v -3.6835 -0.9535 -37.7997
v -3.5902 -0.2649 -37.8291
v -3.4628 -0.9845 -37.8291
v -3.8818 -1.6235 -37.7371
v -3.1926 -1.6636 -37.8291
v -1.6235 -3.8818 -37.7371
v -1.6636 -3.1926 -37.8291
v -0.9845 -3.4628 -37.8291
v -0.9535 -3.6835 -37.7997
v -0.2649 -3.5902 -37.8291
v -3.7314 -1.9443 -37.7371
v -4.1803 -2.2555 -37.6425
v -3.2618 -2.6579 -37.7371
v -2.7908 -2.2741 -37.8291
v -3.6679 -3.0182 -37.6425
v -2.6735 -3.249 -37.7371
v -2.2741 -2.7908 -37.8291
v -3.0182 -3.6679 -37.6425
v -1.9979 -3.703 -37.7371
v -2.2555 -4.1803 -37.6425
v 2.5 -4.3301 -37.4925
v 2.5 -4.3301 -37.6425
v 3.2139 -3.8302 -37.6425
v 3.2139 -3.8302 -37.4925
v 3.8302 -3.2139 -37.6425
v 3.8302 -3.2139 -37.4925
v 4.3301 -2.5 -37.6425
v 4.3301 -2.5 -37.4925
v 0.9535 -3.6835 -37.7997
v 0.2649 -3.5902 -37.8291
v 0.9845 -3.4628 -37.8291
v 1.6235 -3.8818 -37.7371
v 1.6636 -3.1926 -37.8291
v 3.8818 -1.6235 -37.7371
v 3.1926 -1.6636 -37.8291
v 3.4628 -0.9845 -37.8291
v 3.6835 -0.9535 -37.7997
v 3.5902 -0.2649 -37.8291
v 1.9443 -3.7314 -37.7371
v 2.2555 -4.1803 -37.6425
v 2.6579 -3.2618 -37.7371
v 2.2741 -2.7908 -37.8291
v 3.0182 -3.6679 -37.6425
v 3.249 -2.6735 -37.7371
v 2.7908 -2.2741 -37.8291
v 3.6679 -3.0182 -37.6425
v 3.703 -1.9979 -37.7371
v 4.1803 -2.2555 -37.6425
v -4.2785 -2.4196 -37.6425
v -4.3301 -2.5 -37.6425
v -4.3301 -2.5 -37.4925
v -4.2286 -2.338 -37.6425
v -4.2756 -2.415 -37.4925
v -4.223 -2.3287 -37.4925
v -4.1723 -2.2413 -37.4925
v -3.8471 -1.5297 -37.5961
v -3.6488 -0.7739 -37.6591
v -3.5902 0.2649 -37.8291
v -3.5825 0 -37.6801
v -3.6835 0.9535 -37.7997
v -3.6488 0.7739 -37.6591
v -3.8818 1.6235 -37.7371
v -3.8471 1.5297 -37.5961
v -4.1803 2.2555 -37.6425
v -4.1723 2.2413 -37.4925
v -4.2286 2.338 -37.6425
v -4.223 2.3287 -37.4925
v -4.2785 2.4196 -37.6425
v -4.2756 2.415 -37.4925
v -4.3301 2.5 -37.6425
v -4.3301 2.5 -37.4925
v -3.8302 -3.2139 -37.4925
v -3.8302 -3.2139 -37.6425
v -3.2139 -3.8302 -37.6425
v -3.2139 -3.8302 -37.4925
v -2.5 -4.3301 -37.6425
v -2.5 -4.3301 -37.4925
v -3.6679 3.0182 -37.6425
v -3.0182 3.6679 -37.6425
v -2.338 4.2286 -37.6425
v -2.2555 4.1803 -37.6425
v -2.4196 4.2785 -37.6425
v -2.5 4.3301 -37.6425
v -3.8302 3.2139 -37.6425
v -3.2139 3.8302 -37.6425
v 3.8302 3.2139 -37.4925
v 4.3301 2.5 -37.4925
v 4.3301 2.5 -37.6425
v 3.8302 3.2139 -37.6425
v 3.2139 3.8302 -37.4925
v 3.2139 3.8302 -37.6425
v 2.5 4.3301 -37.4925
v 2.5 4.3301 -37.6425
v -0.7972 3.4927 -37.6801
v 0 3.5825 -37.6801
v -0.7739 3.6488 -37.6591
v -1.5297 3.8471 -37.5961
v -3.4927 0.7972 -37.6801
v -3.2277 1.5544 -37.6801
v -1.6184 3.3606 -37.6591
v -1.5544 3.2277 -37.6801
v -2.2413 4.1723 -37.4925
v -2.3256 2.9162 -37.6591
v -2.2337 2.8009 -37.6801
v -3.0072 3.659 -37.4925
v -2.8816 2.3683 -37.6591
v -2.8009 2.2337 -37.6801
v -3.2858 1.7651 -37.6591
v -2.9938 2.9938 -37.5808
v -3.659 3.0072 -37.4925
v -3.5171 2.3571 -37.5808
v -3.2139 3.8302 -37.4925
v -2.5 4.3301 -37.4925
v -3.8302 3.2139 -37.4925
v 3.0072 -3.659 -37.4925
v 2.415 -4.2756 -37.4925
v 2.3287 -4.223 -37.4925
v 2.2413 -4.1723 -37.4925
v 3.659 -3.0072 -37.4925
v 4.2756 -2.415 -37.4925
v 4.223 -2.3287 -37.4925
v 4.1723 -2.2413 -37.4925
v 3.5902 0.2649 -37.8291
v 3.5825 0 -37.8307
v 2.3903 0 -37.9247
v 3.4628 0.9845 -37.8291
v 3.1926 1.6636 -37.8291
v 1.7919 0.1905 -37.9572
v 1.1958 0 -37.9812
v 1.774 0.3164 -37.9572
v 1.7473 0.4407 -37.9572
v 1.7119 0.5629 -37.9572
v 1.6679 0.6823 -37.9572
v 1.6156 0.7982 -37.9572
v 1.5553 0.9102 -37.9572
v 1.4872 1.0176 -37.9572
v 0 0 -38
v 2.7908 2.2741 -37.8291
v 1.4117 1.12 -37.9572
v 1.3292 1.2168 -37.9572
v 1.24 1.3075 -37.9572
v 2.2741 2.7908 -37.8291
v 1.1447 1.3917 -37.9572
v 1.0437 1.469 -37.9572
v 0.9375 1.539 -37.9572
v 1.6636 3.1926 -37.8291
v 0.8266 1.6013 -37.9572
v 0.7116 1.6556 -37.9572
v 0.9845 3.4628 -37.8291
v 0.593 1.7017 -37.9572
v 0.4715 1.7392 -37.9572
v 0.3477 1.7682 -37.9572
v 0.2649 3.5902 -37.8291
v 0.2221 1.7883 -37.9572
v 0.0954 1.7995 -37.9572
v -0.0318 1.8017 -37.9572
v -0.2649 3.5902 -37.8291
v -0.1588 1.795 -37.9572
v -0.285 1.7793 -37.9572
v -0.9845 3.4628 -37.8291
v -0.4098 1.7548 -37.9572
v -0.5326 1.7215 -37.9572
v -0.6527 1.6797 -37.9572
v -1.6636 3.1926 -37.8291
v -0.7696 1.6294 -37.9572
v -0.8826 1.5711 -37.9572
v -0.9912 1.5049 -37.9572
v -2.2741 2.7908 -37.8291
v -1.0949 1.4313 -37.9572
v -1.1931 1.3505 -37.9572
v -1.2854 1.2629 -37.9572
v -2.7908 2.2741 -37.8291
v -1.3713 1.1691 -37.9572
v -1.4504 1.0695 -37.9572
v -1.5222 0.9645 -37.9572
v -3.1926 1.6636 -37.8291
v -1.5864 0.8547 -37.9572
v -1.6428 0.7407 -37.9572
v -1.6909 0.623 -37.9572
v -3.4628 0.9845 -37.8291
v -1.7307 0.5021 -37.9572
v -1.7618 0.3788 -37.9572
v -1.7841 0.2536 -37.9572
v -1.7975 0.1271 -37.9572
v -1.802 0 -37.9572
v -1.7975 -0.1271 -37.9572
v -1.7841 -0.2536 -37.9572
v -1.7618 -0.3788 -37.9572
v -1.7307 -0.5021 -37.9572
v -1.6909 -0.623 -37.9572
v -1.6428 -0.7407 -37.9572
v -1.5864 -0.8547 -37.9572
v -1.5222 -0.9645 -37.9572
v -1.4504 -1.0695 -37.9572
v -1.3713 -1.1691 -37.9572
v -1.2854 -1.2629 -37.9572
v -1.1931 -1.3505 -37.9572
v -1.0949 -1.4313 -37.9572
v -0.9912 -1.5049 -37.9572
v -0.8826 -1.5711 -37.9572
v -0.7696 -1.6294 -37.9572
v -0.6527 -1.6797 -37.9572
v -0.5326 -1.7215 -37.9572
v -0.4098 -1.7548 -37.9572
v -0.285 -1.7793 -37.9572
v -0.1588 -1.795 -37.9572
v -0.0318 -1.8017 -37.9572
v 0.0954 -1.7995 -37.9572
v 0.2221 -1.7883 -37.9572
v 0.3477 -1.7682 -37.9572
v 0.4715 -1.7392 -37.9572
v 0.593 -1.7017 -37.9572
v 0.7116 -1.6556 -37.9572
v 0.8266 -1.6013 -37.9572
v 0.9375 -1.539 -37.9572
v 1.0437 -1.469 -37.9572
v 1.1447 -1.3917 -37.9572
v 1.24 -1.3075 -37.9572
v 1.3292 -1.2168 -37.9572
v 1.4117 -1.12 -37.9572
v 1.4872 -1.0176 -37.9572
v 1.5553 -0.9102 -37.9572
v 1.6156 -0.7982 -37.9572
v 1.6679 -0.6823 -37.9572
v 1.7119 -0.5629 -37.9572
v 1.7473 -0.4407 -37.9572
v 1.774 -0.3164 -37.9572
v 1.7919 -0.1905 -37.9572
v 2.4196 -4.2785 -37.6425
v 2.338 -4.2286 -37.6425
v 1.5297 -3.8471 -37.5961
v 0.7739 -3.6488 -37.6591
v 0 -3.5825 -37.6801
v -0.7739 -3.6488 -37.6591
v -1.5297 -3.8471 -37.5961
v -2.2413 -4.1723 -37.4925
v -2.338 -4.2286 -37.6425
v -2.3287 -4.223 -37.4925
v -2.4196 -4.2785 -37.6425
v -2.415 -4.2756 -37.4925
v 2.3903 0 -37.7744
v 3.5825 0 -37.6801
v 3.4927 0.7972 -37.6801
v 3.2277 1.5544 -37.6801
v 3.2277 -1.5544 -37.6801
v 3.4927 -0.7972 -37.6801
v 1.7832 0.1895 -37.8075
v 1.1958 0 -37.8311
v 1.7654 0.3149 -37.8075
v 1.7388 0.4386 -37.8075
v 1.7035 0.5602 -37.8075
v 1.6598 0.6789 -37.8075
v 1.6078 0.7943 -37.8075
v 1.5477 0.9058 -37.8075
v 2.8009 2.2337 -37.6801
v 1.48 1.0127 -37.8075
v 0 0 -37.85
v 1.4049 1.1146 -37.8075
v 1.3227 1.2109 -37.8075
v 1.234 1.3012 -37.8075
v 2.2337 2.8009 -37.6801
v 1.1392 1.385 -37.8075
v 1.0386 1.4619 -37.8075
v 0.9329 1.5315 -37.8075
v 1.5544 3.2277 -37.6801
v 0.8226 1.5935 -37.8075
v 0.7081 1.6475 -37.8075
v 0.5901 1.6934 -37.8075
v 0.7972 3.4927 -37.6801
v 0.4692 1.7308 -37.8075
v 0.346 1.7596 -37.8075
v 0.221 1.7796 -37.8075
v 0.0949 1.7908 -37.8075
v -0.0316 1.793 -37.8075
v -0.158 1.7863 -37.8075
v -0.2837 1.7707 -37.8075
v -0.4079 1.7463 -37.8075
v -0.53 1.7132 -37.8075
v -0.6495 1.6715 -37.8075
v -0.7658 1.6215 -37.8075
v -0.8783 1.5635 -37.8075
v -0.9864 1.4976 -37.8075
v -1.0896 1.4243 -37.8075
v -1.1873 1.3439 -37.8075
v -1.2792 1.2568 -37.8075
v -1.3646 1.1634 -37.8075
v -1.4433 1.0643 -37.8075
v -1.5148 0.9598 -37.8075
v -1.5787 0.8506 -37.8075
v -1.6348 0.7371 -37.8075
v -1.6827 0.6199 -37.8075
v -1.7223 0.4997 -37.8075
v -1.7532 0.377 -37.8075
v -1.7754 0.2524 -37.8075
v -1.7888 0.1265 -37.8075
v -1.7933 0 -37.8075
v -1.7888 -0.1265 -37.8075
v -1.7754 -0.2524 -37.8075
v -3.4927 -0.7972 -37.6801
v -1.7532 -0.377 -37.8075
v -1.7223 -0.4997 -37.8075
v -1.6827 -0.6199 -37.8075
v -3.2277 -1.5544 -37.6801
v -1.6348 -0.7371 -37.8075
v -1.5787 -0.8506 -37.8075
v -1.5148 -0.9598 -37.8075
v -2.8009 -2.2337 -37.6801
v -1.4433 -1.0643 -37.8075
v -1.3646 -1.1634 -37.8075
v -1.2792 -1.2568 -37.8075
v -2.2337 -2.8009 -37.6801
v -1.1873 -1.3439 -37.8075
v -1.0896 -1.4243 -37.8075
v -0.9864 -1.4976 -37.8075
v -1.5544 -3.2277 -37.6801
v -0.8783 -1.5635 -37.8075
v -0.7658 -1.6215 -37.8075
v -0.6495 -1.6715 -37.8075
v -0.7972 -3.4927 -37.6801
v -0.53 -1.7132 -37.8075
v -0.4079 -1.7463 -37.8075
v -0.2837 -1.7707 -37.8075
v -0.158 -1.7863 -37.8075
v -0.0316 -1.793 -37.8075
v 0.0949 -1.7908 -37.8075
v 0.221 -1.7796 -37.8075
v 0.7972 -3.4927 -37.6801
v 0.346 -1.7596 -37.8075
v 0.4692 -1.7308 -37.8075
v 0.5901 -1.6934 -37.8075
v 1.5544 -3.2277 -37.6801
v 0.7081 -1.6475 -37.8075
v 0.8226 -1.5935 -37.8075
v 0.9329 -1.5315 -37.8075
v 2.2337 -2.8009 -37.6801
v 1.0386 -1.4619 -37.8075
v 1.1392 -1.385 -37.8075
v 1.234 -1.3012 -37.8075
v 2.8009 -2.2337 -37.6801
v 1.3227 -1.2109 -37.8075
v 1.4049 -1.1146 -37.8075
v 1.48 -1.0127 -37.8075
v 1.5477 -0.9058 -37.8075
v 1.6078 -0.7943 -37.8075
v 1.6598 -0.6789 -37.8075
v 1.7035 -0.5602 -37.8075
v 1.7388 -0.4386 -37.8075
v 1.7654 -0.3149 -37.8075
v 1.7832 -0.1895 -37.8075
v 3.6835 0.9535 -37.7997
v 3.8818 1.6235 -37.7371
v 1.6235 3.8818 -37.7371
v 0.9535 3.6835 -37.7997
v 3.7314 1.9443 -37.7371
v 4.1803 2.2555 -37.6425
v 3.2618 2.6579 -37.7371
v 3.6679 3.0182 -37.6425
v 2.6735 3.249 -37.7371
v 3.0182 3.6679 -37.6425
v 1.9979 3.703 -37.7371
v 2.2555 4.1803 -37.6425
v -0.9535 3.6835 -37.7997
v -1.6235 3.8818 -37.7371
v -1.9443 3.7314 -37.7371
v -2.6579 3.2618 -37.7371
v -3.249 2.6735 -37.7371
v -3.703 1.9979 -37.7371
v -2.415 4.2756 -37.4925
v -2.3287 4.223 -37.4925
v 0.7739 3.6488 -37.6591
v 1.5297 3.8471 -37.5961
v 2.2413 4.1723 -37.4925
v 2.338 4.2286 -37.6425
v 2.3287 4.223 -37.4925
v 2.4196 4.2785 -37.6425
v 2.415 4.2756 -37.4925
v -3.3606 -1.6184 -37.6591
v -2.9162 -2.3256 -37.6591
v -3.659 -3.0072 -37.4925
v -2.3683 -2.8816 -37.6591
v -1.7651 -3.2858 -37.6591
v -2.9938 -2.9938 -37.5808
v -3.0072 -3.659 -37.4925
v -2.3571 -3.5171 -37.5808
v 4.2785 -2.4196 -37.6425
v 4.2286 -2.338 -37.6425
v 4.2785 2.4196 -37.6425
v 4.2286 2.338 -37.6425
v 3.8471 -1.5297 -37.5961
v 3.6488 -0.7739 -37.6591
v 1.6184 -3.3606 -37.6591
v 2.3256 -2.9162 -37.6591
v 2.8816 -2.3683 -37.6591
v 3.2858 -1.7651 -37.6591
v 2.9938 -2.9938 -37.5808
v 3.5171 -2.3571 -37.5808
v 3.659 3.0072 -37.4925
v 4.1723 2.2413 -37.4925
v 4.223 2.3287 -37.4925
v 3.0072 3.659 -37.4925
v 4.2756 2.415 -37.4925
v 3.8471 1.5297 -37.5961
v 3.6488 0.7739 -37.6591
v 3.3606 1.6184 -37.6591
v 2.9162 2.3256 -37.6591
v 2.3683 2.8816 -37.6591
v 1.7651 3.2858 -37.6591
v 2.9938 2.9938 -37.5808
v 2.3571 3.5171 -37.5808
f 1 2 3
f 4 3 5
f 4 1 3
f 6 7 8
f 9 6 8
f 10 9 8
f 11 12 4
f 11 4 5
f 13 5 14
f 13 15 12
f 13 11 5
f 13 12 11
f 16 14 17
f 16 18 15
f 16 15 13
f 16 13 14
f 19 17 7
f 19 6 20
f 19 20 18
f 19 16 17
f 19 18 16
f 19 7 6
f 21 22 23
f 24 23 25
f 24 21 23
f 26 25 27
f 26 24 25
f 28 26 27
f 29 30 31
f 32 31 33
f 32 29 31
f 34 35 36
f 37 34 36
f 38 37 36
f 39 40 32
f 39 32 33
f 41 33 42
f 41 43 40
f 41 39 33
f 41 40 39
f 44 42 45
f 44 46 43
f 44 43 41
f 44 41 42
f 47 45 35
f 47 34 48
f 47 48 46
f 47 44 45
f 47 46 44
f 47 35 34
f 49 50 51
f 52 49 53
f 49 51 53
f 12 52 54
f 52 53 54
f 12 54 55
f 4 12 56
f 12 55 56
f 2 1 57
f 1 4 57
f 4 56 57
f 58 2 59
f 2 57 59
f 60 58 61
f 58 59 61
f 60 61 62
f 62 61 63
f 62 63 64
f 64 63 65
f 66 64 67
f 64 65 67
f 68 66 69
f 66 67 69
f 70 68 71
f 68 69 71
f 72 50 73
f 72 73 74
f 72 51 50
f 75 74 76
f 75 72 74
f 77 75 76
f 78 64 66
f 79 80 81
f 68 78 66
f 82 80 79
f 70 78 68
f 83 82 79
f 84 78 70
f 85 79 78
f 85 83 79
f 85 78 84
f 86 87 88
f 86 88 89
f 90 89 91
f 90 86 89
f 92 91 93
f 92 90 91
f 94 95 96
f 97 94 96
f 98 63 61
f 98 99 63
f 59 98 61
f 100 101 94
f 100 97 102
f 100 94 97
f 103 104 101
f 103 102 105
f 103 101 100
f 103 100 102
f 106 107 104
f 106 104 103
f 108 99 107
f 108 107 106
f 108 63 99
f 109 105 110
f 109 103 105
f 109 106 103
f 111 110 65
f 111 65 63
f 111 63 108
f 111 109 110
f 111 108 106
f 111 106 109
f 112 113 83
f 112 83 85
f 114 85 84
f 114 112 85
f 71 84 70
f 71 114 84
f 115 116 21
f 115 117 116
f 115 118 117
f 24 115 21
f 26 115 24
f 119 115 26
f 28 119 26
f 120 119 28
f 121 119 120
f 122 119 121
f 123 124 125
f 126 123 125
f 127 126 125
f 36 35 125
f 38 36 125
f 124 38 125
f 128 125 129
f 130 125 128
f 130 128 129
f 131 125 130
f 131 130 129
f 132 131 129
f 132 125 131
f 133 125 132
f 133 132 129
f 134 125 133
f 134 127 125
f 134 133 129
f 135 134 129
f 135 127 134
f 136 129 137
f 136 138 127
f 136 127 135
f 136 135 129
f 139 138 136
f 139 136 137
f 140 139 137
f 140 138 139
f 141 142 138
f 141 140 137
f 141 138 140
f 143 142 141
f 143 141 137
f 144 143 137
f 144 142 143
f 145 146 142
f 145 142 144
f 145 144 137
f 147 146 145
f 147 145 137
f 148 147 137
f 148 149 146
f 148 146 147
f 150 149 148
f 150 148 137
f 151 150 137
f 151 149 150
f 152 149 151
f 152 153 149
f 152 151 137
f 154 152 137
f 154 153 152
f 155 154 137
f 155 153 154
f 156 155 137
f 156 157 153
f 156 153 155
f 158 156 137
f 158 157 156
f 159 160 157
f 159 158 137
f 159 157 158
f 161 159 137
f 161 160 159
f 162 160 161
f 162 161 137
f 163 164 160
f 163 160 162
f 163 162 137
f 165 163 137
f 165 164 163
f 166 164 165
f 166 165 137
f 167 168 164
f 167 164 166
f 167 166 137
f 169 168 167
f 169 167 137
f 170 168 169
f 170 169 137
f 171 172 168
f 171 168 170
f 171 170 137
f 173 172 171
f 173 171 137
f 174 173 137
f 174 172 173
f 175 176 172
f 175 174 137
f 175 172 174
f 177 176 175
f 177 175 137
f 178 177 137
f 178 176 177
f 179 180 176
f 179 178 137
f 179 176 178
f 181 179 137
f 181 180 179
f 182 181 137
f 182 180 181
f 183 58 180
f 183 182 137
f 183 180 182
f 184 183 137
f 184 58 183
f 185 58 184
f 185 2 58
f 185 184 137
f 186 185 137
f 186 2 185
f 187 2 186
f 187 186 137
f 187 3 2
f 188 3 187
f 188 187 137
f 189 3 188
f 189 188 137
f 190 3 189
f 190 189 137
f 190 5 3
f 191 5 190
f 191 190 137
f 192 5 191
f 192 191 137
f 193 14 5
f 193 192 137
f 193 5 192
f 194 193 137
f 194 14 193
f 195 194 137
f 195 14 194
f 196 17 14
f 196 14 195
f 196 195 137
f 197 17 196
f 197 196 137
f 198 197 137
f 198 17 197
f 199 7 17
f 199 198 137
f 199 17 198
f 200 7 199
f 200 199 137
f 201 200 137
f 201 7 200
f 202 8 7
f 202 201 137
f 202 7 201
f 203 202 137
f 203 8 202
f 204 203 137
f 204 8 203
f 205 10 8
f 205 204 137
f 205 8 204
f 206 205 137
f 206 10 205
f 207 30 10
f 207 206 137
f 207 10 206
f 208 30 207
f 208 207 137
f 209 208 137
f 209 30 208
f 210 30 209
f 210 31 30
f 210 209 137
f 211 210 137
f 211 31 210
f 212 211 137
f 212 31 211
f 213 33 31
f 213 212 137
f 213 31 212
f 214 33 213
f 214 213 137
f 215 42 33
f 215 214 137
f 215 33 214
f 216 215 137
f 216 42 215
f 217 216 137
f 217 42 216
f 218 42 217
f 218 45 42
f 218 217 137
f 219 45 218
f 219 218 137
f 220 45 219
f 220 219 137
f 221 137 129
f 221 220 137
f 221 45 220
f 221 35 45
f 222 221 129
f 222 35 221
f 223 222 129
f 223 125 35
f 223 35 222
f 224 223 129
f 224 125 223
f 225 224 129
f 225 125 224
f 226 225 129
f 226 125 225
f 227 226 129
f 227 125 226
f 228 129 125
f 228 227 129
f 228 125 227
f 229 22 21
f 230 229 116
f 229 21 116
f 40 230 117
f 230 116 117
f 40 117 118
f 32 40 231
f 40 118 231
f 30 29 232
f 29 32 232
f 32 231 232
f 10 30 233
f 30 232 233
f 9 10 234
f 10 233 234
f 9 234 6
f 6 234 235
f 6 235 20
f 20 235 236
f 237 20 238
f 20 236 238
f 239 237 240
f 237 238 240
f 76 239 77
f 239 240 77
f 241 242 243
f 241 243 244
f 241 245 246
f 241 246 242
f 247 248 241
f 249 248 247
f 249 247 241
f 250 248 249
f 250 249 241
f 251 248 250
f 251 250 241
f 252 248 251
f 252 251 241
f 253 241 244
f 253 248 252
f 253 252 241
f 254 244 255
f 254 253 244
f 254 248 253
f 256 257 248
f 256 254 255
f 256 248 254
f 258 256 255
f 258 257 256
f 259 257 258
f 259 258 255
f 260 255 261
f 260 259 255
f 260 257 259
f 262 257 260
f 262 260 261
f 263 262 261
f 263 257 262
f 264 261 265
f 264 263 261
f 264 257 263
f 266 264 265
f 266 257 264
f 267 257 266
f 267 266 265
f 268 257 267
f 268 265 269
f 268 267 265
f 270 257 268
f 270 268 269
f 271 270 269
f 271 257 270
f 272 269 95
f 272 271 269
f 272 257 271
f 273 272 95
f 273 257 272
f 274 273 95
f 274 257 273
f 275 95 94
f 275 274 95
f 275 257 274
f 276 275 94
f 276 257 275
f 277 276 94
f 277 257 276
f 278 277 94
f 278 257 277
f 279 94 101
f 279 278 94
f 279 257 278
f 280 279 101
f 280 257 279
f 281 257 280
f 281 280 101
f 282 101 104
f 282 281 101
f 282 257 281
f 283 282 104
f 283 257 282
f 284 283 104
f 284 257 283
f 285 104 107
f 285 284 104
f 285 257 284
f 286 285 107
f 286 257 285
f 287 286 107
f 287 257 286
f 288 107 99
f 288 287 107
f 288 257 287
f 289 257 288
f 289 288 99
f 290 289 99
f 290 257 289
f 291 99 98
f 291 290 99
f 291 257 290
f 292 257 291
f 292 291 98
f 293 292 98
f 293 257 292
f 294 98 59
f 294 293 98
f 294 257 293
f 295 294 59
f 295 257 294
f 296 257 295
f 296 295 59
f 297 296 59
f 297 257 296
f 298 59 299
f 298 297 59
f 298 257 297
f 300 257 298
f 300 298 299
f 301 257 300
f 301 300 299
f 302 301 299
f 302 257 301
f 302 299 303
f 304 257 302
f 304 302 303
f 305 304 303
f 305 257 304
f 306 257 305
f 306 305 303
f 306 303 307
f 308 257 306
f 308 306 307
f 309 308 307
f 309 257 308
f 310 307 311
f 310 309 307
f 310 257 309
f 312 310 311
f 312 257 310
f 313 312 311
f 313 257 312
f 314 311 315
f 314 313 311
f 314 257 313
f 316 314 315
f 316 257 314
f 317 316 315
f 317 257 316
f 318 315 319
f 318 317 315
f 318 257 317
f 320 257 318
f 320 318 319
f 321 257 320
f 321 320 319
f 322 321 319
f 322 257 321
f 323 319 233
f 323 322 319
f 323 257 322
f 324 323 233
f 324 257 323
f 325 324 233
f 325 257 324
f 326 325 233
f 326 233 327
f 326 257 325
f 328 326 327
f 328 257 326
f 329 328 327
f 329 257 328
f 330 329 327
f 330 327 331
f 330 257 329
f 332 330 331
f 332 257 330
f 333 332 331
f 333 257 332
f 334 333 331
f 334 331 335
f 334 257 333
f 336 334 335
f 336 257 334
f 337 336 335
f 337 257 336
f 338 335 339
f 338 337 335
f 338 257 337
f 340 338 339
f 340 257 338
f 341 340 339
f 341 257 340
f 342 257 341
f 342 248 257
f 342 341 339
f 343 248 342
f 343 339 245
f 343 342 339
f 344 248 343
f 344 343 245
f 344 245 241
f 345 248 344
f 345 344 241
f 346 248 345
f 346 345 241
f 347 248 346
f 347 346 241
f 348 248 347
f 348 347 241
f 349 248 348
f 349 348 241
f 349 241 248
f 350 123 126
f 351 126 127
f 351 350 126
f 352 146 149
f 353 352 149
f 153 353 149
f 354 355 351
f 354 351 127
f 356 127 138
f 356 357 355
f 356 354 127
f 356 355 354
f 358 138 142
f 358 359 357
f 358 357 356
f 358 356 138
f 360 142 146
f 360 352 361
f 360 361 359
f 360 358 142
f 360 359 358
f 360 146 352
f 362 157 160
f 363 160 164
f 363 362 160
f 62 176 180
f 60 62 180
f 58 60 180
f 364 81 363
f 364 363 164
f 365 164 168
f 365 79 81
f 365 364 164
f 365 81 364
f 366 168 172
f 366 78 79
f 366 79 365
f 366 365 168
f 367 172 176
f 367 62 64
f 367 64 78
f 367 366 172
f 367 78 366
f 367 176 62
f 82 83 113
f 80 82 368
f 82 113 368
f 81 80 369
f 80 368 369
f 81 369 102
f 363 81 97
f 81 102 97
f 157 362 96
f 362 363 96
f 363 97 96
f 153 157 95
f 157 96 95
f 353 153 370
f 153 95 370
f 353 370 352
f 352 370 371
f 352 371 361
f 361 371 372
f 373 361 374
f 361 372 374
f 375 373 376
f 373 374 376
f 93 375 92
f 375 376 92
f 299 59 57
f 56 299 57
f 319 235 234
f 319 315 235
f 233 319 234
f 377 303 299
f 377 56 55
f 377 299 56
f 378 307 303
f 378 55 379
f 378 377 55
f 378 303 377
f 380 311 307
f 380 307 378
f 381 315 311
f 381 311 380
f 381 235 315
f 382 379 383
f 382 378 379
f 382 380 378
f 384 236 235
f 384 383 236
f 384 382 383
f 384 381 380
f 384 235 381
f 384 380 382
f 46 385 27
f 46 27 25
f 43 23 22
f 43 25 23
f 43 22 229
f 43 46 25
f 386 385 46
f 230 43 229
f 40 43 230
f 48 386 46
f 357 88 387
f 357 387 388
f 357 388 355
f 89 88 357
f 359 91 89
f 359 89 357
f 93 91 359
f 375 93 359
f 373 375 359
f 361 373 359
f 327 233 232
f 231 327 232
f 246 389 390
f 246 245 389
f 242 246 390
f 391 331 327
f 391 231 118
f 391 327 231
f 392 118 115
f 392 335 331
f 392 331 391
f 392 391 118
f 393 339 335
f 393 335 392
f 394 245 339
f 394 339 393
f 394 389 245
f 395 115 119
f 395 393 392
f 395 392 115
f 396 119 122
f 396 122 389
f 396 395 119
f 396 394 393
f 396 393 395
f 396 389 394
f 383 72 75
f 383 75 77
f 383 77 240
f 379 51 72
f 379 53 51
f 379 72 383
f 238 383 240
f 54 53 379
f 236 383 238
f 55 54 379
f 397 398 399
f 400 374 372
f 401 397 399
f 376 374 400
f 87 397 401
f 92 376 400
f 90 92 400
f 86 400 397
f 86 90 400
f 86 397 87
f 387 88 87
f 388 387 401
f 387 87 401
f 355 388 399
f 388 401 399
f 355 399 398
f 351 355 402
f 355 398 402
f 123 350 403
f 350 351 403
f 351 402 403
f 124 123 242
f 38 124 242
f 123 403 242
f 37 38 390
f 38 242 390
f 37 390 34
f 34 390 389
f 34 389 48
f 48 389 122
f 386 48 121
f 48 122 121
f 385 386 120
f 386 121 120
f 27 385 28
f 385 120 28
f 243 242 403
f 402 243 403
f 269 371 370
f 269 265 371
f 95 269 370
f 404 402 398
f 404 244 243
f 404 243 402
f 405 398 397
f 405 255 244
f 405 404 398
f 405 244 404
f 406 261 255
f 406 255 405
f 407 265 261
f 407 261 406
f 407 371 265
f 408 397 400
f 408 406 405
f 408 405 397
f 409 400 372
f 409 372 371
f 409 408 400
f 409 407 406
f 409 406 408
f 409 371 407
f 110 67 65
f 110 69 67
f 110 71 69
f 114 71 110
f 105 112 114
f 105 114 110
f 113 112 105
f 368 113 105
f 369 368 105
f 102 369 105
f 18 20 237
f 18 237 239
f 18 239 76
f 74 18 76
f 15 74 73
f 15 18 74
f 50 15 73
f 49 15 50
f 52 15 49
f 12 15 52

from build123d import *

# Parameters (mm, degrees)
CUT_EXTRUDE_1_DEPTH = 10


with BuildPart() as part:
    # 草图1 → 旋转5 (revolve)
    with BuildSketch(Plane(origin=(0, 0, 0), x_dir=(1, 0, 0), z_dir=(0, 1, 0))):
        with BuildLine():
            Line((4.75, 37.642530217), (5, 37.642530217))
            Line((5, 37.642530217), (5, 37.492530217))
            Line((5, 37.492530217), (4.736204208, 37.492530217))
            ThreePointArc((4.736204208, 37.492530217), (4.160424845, 37.592803525), (3.58253169, 37.680073868))
            ThreePointArc((3.58253169, 37.680073868), (1.793279691, 37.8074946), (0, 37.85))
            Line((0, 37.85), (0, 38))
            ThreePointArc((0, 38), (1.802027362, 37.957248285), (3.6, 37.829089336))
            ThreePointArc((3.6, 37.829089336), (4.176041915, 37.742232418), (4.75, 37.642530217))
        make_face()
    revolve(axis=Axis((0, 0, -22.128426055), (0, 0, 1)))

    # 草图2 → 切除-拉伸1 (cut)
    with BuildSketch(Plane.XY.offset(-37.492530217)):
        with BuildLine():
            ThreePointArc((4.330127019, -2.5), (5, 0), (4.330127019, 2.5))
            ThreePointArc((4.330127019, 2.5), (3.58253169, 0), (4.330127019, -2.5))
        make_face()
        with BuildLine():
            ThreePointArc((2.5, 4.330127019), (0, 5), (-2.5, 4.330127019))
            ThreePointArc((-2.5, 4.330127019), (0, 3.58253169), (2.5, 4.330127019))
        make_face()
        with BuildLine():
            ThreePointArc((-2.5, -4.330127019), (0, -5), (2.5, -4.330127019))
            ThreePointArc((2.5, -4.330127019), (0, -3.58253169), (-2.5, -4.330127019))
        make_face()
        with BuildLine():
            ThreePointArc((-4.330127019, 2.5), (-5, 0), (-4.330127019, -2.5))
            ThreePointArc((-4.330127019, -2.5), (-3.58253169, 0), (-4.330127019, 2.5))
        make_face()
    extrude(amount=-CUT_EXTRUDE_1_DEPTH, mode=Mode.SUBTRACT)


solid = part.part
